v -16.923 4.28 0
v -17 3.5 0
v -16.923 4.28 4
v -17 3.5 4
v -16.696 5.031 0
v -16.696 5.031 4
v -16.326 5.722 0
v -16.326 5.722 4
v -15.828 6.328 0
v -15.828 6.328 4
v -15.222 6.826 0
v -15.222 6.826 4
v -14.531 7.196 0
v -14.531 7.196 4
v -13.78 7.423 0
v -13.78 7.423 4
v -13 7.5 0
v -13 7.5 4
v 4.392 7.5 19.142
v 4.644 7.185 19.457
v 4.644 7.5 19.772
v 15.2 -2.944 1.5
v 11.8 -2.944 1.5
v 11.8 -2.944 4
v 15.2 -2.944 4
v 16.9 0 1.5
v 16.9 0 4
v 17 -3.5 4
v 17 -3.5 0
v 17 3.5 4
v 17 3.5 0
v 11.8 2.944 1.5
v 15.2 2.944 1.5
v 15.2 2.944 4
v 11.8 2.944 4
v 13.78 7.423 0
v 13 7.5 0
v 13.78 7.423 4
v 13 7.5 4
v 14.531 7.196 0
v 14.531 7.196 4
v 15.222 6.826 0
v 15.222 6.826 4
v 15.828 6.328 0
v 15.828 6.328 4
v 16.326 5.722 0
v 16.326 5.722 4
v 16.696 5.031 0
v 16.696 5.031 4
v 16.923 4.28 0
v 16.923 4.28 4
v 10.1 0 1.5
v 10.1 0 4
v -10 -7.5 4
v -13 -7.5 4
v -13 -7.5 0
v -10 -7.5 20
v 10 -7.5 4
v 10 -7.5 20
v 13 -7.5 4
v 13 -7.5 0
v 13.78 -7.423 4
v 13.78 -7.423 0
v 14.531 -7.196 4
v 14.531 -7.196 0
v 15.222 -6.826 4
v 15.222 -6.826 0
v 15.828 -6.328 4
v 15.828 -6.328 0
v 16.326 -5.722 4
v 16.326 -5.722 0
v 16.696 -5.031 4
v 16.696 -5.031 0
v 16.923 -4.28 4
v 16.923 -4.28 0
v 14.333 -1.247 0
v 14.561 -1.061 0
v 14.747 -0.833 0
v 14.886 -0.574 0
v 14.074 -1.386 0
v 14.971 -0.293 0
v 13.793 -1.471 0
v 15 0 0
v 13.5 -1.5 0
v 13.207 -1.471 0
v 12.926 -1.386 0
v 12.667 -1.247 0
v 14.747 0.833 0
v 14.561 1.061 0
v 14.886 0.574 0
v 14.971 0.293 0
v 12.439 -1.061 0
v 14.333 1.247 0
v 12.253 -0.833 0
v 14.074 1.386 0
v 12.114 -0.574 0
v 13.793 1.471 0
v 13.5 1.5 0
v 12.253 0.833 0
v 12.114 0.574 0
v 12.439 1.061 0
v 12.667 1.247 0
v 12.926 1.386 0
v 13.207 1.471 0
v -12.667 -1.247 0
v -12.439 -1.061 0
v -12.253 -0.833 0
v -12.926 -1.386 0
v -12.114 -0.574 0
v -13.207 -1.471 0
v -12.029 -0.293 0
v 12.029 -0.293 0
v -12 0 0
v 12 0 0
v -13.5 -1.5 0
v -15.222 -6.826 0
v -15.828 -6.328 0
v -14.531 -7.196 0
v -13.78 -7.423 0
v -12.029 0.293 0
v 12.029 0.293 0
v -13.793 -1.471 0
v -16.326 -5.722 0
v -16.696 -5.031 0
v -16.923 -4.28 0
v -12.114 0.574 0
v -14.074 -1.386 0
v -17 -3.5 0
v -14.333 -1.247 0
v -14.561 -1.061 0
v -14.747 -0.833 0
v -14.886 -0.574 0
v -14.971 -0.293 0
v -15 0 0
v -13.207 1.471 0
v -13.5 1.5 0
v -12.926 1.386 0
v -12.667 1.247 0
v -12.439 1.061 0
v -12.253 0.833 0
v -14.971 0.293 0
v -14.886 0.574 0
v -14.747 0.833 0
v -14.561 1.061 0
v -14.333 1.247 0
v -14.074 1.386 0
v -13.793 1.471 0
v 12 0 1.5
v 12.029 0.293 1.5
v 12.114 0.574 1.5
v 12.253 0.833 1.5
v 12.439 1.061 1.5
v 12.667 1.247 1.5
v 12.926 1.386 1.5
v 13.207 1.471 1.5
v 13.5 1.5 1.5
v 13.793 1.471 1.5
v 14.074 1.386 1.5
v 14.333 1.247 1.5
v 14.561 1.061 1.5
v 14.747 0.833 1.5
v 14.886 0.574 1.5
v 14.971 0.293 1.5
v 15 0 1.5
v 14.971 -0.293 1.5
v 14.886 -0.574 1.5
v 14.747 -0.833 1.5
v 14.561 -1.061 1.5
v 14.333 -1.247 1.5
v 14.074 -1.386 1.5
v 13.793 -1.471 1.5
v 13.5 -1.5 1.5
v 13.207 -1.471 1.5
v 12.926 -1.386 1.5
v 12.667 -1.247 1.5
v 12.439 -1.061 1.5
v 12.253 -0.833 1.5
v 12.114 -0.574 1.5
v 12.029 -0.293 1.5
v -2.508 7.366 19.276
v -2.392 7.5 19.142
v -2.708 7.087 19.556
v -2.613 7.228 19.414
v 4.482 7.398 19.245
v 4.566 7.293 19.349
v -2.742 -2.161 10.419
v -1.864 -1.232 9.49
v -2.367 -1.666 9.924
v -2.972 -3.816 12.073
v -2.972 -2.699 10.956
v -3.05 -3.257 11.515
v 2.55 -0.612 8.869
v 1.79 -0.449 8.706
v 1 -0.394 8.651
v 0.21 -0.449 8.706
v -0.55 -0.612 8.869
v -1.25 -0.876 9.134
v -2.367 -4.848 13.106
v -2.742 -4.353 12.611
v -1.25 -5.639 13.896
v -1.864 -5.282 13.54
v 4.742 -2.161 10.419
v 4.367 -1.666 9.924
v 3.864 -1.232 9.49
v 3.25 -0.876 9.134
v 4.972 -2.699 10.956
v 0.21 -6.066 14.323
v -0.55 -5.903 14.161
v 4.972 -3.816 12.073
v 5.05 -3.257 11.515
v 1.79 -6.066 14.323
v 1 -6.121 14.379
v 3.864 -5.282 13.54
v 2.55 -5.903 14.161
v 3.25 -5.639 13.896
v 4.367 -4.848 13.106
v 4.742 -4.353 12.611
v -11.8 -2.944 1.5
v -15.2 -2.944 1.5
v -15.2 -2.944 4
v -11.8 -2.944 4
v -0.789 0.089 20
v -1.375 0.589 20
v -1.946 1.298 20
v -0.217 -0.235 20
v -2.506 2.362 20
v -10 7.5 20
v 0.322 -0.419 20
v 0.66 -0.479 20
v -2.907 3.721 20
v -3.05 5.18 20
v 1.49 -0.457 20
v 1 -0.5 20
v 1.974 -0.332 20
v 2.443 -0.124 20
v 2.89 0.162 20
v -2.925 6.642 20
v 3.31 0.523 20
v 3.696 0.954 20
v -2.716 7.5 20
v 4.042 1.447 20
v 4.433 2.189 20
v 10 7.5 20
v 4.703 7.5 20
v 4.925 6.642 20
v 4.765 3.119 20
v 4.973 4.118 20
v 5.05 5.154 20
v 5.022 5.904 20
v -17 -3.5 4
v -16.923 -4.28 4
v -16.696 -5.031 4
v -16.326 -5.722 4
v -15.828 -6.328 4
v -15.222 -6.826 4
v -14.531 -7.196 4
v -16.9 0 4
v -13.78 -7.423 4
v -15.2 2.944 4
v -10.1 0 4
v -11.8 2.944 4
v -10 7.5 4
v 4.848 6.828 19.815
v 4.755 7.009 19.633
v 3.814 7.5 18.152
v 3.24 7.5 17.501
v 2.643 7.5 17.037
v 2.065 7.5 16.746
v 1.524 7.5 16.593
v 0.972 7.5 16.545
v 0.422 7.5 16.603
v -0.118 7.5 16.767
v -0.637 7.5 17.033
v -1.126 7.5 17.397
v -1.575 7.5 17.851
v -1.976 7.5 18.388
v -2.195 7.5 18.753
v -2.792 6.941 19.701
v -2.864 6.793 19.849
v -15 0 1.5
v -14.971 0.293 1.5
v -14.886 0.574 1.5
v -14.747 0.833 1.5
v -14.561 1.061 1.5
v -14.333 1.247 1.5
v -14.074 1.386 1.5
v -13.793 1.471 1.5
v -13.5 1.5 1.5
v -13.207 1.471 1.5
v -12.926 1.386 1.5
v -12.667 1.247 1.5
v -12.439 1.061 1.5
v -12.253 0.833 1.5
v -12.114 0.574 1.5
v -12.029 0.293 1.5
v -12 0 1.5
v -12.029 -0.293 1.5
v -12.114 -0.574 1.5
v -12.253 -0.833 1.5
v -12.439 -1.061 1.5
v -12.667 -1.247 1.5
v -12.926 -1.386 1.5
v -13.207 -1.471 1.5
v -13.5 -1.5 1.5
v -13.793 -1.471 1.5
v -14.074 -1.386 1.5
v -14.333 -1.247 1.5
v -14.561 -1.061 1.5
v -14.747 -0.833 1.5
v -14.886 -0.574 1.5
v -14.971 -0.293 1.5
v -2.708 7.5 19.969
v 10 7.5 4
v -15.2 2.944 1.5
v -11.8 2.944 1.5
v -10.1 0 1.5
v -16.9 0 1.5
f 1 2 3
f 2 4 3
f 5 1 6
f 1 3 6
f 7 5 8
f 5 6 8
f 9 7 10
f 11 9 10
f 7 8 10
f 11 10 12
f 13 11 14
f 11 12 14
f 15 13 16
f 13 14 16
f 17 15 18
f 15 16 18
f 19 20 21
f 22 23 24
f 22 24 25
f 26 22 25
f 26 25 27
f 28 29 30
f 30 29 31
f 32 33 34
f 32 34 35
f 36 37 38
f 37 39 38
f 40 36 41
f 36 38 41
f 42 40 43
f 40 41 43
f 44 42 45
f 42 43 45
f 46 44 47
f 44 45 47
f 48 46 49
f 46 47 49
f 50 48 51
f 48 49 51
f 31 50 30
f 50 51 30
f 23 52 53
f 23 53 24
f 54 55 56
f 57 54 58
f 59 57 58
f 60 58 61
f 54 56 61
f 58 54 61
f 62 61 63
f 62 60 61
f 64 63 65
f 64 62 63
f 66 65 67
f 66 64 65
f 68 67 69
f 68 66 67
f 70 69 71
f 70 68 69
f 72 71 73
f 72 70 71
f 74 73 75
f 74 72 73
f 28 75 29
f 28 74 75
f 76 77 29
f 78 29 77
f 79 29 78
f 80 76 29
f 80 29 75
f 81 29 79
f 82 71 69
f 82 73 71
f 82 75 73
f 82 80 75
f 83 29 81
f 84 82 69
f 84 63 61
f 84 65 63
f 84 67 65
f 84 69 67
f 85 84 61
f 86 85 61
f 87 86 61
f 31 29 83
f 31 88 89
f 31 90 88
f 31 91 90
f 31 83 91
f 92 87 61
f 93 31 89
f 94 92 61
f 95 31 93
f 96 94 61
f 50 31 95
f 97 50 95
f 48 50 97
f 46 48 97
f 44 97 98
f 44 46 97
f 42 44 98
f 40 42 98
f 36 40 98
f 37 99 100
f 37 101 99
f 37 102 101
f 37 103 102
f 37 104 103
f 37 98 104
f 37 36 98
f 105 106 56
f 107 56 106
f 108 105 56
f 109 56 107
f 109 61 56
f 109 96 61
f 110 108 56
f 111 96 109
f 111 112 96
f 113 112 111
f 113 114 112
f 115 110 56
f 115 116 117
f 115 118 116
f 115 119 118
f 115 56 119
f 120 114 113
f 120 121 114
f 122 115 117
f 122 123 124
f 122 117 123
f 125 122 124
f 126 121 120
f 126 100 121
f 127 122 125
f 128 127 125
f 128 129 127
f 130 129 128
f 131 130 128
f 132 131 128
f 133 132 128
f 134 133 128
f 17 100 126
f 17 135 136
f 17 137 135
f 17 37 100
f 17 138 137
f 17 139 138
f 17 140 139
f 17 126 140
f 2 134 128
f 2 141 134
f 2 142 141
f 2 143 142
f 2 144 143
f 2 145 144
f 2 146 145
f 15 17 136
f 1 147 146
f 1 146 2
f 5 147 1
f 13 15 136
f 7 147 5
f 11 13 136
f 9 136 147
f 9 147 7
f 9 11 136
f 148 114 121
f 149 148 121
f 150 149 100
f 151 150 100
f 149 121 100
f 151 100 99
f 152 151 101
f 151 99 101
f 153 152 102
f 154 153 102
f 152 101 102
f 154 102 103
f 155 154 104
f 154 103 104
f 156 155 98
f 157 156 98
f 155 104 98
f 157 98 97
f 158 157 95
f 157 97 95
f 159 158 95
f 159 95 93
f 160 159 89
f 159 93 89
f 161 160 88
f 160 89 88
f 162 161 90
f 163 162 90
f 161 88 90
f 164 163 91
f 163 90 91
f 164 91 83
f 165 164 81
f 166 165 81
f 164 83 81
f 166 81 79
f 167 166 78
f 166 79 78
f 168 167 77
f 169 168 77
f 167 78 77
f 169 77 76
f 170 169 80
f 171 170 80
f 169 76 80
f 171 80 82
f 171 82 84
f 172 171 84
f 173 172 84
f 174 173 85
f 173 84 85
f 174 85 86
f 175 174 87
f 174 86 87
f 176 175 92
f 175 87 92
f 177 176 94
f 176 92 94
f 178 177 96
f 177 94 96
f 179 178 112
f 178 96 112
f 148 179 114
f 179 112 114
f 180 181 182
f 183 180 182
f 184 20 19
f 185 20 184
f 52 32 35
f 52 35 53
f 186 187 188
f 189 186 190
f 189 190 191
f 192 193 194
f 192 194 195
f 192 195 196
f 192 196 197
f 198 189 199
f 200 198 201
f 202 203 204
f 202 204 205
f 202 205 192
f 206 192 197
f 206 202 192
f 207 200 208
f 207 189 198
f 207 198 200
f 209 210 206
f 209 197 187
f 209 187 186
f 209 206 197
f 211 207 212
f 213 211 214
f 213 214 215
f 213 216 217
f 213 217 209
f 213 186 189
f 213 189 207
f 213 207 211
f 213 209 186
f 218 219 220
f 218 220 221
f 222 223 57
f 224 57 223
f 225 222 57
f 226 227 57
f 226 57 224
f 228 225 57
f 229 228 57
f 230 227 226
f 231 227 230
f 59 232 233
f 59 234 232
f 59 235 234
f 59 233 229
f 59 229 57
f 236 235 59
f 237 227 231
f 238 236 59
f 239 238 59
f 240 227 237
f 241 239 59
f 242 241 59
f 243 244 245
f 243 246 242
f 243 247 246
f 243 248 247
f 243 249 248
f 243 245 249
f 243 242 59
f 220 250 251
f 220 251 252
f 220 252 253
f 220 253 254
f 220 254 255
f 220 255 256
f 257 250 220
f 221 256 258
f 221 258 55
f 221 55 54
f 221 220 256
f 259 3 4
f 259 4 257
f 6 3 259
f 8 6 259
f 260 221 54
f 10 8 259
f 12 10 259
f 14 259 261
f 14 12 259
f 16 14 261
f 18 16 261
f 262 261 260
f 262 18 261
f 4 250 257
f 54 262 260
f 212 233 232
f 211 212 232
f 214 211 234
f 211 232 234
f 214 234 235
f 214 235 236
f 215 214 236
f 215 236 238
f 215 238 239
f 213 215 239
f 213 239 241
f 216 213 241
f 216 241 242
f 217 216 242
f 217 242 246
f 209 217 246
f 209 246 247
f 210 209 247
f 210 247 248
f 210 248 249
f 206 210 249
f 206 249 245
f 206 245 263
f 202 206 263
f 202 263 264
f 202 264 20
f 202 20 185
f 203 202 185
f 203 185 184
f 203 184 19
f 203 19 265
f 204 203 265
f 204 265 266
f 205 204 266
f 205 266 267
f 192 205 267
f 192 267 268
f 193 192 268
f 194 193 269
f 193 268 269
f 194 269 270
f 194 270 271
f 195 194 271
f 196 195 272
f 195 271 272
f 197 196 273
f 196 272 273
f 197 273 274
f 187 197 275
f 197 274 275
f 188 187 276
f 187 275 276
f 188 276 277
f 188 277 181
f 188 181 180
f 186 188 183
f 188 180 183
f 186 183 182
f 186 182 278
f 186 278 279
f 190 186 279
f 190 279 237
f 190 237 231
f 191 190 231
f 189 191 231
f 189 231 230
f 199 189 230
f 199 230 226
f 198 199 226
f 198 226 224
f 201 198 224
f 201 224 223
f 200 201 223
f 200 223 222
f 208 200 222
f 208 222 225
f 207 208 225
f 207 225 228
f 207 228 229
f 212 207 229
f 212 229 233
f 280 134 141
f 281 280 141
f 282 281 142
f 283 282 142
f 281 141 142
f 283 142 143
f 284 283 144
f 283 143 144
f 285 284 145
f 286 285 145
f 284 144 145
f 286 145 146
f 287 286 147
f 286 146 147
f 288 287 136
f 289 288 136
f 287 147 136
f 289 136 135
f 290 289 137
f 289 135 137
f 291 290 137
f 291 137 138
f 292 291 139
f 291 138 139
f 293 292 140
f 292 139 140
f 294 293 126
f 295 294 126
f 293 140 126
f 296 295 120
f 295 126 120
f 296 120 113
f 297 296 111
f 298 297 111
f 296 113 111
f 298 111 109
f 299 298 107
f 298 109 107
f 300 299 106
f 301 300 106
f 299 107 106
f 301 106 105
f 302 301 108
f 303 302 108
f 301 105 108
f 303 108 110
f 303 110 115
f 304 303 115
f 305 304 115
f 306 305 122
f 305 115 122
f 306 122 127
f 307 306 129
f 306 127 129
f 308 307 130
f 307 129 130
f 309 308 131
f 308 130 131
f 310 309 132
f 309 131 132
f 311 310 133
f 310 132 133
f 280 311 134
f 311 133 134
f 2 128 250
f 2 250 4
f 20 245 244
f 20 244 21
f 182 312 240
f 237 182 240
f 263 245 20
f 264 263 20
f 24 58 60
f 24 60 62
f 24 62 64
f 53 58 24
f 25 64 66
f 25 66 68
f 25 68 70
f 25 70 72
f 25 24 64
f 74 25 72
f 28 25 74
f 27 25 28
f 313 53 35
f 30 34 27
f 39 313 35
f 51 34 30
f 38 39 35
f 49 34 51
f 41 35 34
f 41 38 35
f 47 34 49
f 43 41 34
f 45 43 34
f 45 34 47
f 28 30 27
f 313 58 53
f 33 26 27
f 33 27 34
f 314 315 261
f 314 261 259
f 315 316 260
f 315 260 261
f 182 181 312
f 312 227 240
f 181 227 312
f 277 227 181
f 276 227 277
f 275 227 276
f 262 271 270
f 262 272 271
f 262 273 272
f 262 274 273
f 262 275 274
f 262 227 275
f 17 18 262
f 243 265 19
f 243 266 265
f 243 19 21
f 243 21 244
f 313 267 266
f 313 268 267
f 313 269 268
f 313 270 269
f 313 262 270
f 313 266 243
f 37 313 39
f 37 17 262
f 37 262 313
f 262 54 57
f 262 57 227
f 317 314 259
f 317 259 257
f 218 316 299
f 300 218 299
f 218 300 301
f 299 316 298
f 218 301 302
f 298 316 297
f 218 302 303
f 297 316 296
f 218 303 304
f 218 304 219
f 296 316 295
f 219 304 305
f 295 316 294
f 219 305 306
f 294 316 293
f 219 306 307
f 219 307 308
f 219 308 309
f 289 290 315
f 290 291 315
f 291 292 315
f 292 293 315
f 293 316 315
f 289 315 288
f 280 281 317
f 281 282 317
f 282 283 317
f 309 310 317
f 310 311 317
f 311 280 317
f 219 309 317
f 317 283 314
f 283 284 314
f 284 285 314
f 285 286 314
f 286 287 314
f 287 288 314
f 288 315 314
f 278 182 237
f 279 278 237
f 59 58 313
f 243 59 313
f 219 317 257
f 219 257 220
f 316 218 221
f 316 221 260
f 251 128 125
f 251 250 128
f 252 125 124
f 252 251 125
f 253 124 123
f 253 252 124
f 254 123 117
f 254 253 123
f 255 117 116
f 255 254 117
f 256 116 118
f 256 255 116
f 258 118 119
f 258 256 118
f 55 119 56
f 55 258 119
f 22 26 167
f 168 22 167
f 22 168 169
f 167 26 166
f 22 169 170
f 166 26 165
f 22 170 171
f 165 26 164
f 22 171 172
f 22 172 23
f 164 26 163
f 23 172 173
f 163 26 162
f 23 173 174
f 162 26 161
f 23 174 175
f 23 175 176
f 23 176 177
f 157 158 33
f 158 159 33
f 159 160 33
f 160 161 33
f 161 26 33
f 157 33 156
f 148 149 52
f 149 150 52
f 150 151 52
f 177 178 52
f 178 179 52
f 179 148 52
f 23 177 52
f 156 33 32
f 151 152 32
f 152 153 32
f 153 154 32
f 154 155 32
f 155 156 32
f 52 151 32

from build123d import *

# Parameters (mm, degrees)
SKETCH_1_W          = 20
SKETCH_1_H          = 15
EXTRUDE_1_DEPTH     = 20
SKETCH_2_W          = 7
SKETCH_2_H          = 15
EXTRUDE_6_DEPTH     = 4
EXTRUDE_7_DEPTH     = 1.5
SKETCH_10_R         = 1.5
CUT_EXTRUDE_4_DEPTH = 1.5
FILLET_1_R          = 4
SKETCH_11_R         = 4.05
CUT_EXTRUDE_5_DEPTH = 13
CUT_EXTRUDE_6_DEPTH = 10


with BuildPart() as part:
    # 草图1 → 凸台-拉伸1 (new body)
    with BuildSketch(Plane.XY):
        Rectangle(SKETCH_1_W, SKETCH_1_H)
    extrude(amount=EXTRUDE_1_DEPTH)

    # 草图2 → 凸台-拉伸6 (add)
    # profile 1 of 2: a face of its own
    with BuildSketch(Plane.XY):
        with Locations((-13.5, 0)):
            Rectangle(SKETCH_2_W, SKETCH_2_H)
        Polygon((-10.1, 0), (-11.8, 2.944486373), (-15.2, 2.944486373), (-16.9, 0), (-15.2, -2.944486373), (-11.8, -2.944486373), align=None, mode=Mode.SUBTRACT)
    # profile 2 of 2: a face of its own
    with BuildSketch(Plane.XY):
        with Locations((13.5, 0)):
            Rectangle(SKETCH_2_W, SKETCH_2_H)
        Polygon((16.9, 0), (15.2, 2.944486373), (11.8, 2.944486373), (10.1, 0), (11.8, -2.944486373), (15.2, -2.944486373), align=None, mode=Mode.SUBTRACT)
    extrude(amount=EXTRUDE_6_DEPTH)

    # 草图9 → 凸台-拉伸7 (add)
    with BuildSketch(Plane(origin=(0, 0, 0), x_dir=(-1, 0, 0), z_dir=(0, 0, -1))):
        Polygon((-10.1, 0), (-11.8, 2.944486373), (-15.2, 2.944486373), (-16.9, 0), (-15.2, -2.944486373), (-11.8, -2.944486373), align=None)
        Polygon((16.9, 0), (15.2, 2.944486373), (11.8, 2.944486373), (10.1, 0), (11.8, -2.944486373), (15.2, -2.944486373), align=None)
    extrude(amount=-EXTRUDE_7_DEPTH)

    # 草图10 → 切除-拉伸4 (cut)
    with BuildSketch(Plane(origin=(0, 0, 0), x_dir=(-1, 0, 0), z_dir=(0, 0, -1))):
        with Locations((-13.5, 0)):
            Circle(SKETCH_10_R)
        with Locations((13.5, 0)):
            Circle(SKETCH_10_R)
    extrude(amount=-CUT_EXTRUDE_4_DEPTH, mode=Mode.SUBTRACT)

    # 圆角1
    fillet_1_edges = [part.edges().sort_by_distance(p)[0] for p in [
        (-17, 7.5, 2),
        (-17, -7.5, 2),
        (17, -7.5, 2),
        (17, 7.5, 2),
    ]]
    fillet(fillet_1_edges, radius=FILLET_1_R)

    # 草图11 → 切除-拉伸5 (cut)
    with BuildSketch(Plane(origin=(0, 13.321067812, 13.321067812), x_dir=(1, 0, 0), z_dir=(0, 0.7071067811865389, 0.7071067811865561))):
        with Locations(Location((1, -10.445436483, 0), (0, 0, 270))):
            Circle(SKETCH_11_R)
    extrude(amount=-CUT_EXTRUDE_5_DEPTH, mode=Mode.SUBTRACT)

    # 草图12 → 切除-拉伸6 (cut)
    with BuildSketch(Plane(origin=(0, 13.321067812, 13.321067812), x_dir=(1, 0, 0), z_dir=(0, -0.7071067811865389, -0.7071067811865562))):
        Polygon((4.391788695, 8.232233047), (-2.391788695, 8.232233047), (-2.708147576, 8.816896782), (-2.924601891, 9.445436483), (4.924601891, 9.445436483), (4.643673318, 8.677345775), align=None)
    extrude(amount=-CUT_EXTRUDE_6_DEPTH, mode=Mode.SUBTRACT)


solid = part.part
